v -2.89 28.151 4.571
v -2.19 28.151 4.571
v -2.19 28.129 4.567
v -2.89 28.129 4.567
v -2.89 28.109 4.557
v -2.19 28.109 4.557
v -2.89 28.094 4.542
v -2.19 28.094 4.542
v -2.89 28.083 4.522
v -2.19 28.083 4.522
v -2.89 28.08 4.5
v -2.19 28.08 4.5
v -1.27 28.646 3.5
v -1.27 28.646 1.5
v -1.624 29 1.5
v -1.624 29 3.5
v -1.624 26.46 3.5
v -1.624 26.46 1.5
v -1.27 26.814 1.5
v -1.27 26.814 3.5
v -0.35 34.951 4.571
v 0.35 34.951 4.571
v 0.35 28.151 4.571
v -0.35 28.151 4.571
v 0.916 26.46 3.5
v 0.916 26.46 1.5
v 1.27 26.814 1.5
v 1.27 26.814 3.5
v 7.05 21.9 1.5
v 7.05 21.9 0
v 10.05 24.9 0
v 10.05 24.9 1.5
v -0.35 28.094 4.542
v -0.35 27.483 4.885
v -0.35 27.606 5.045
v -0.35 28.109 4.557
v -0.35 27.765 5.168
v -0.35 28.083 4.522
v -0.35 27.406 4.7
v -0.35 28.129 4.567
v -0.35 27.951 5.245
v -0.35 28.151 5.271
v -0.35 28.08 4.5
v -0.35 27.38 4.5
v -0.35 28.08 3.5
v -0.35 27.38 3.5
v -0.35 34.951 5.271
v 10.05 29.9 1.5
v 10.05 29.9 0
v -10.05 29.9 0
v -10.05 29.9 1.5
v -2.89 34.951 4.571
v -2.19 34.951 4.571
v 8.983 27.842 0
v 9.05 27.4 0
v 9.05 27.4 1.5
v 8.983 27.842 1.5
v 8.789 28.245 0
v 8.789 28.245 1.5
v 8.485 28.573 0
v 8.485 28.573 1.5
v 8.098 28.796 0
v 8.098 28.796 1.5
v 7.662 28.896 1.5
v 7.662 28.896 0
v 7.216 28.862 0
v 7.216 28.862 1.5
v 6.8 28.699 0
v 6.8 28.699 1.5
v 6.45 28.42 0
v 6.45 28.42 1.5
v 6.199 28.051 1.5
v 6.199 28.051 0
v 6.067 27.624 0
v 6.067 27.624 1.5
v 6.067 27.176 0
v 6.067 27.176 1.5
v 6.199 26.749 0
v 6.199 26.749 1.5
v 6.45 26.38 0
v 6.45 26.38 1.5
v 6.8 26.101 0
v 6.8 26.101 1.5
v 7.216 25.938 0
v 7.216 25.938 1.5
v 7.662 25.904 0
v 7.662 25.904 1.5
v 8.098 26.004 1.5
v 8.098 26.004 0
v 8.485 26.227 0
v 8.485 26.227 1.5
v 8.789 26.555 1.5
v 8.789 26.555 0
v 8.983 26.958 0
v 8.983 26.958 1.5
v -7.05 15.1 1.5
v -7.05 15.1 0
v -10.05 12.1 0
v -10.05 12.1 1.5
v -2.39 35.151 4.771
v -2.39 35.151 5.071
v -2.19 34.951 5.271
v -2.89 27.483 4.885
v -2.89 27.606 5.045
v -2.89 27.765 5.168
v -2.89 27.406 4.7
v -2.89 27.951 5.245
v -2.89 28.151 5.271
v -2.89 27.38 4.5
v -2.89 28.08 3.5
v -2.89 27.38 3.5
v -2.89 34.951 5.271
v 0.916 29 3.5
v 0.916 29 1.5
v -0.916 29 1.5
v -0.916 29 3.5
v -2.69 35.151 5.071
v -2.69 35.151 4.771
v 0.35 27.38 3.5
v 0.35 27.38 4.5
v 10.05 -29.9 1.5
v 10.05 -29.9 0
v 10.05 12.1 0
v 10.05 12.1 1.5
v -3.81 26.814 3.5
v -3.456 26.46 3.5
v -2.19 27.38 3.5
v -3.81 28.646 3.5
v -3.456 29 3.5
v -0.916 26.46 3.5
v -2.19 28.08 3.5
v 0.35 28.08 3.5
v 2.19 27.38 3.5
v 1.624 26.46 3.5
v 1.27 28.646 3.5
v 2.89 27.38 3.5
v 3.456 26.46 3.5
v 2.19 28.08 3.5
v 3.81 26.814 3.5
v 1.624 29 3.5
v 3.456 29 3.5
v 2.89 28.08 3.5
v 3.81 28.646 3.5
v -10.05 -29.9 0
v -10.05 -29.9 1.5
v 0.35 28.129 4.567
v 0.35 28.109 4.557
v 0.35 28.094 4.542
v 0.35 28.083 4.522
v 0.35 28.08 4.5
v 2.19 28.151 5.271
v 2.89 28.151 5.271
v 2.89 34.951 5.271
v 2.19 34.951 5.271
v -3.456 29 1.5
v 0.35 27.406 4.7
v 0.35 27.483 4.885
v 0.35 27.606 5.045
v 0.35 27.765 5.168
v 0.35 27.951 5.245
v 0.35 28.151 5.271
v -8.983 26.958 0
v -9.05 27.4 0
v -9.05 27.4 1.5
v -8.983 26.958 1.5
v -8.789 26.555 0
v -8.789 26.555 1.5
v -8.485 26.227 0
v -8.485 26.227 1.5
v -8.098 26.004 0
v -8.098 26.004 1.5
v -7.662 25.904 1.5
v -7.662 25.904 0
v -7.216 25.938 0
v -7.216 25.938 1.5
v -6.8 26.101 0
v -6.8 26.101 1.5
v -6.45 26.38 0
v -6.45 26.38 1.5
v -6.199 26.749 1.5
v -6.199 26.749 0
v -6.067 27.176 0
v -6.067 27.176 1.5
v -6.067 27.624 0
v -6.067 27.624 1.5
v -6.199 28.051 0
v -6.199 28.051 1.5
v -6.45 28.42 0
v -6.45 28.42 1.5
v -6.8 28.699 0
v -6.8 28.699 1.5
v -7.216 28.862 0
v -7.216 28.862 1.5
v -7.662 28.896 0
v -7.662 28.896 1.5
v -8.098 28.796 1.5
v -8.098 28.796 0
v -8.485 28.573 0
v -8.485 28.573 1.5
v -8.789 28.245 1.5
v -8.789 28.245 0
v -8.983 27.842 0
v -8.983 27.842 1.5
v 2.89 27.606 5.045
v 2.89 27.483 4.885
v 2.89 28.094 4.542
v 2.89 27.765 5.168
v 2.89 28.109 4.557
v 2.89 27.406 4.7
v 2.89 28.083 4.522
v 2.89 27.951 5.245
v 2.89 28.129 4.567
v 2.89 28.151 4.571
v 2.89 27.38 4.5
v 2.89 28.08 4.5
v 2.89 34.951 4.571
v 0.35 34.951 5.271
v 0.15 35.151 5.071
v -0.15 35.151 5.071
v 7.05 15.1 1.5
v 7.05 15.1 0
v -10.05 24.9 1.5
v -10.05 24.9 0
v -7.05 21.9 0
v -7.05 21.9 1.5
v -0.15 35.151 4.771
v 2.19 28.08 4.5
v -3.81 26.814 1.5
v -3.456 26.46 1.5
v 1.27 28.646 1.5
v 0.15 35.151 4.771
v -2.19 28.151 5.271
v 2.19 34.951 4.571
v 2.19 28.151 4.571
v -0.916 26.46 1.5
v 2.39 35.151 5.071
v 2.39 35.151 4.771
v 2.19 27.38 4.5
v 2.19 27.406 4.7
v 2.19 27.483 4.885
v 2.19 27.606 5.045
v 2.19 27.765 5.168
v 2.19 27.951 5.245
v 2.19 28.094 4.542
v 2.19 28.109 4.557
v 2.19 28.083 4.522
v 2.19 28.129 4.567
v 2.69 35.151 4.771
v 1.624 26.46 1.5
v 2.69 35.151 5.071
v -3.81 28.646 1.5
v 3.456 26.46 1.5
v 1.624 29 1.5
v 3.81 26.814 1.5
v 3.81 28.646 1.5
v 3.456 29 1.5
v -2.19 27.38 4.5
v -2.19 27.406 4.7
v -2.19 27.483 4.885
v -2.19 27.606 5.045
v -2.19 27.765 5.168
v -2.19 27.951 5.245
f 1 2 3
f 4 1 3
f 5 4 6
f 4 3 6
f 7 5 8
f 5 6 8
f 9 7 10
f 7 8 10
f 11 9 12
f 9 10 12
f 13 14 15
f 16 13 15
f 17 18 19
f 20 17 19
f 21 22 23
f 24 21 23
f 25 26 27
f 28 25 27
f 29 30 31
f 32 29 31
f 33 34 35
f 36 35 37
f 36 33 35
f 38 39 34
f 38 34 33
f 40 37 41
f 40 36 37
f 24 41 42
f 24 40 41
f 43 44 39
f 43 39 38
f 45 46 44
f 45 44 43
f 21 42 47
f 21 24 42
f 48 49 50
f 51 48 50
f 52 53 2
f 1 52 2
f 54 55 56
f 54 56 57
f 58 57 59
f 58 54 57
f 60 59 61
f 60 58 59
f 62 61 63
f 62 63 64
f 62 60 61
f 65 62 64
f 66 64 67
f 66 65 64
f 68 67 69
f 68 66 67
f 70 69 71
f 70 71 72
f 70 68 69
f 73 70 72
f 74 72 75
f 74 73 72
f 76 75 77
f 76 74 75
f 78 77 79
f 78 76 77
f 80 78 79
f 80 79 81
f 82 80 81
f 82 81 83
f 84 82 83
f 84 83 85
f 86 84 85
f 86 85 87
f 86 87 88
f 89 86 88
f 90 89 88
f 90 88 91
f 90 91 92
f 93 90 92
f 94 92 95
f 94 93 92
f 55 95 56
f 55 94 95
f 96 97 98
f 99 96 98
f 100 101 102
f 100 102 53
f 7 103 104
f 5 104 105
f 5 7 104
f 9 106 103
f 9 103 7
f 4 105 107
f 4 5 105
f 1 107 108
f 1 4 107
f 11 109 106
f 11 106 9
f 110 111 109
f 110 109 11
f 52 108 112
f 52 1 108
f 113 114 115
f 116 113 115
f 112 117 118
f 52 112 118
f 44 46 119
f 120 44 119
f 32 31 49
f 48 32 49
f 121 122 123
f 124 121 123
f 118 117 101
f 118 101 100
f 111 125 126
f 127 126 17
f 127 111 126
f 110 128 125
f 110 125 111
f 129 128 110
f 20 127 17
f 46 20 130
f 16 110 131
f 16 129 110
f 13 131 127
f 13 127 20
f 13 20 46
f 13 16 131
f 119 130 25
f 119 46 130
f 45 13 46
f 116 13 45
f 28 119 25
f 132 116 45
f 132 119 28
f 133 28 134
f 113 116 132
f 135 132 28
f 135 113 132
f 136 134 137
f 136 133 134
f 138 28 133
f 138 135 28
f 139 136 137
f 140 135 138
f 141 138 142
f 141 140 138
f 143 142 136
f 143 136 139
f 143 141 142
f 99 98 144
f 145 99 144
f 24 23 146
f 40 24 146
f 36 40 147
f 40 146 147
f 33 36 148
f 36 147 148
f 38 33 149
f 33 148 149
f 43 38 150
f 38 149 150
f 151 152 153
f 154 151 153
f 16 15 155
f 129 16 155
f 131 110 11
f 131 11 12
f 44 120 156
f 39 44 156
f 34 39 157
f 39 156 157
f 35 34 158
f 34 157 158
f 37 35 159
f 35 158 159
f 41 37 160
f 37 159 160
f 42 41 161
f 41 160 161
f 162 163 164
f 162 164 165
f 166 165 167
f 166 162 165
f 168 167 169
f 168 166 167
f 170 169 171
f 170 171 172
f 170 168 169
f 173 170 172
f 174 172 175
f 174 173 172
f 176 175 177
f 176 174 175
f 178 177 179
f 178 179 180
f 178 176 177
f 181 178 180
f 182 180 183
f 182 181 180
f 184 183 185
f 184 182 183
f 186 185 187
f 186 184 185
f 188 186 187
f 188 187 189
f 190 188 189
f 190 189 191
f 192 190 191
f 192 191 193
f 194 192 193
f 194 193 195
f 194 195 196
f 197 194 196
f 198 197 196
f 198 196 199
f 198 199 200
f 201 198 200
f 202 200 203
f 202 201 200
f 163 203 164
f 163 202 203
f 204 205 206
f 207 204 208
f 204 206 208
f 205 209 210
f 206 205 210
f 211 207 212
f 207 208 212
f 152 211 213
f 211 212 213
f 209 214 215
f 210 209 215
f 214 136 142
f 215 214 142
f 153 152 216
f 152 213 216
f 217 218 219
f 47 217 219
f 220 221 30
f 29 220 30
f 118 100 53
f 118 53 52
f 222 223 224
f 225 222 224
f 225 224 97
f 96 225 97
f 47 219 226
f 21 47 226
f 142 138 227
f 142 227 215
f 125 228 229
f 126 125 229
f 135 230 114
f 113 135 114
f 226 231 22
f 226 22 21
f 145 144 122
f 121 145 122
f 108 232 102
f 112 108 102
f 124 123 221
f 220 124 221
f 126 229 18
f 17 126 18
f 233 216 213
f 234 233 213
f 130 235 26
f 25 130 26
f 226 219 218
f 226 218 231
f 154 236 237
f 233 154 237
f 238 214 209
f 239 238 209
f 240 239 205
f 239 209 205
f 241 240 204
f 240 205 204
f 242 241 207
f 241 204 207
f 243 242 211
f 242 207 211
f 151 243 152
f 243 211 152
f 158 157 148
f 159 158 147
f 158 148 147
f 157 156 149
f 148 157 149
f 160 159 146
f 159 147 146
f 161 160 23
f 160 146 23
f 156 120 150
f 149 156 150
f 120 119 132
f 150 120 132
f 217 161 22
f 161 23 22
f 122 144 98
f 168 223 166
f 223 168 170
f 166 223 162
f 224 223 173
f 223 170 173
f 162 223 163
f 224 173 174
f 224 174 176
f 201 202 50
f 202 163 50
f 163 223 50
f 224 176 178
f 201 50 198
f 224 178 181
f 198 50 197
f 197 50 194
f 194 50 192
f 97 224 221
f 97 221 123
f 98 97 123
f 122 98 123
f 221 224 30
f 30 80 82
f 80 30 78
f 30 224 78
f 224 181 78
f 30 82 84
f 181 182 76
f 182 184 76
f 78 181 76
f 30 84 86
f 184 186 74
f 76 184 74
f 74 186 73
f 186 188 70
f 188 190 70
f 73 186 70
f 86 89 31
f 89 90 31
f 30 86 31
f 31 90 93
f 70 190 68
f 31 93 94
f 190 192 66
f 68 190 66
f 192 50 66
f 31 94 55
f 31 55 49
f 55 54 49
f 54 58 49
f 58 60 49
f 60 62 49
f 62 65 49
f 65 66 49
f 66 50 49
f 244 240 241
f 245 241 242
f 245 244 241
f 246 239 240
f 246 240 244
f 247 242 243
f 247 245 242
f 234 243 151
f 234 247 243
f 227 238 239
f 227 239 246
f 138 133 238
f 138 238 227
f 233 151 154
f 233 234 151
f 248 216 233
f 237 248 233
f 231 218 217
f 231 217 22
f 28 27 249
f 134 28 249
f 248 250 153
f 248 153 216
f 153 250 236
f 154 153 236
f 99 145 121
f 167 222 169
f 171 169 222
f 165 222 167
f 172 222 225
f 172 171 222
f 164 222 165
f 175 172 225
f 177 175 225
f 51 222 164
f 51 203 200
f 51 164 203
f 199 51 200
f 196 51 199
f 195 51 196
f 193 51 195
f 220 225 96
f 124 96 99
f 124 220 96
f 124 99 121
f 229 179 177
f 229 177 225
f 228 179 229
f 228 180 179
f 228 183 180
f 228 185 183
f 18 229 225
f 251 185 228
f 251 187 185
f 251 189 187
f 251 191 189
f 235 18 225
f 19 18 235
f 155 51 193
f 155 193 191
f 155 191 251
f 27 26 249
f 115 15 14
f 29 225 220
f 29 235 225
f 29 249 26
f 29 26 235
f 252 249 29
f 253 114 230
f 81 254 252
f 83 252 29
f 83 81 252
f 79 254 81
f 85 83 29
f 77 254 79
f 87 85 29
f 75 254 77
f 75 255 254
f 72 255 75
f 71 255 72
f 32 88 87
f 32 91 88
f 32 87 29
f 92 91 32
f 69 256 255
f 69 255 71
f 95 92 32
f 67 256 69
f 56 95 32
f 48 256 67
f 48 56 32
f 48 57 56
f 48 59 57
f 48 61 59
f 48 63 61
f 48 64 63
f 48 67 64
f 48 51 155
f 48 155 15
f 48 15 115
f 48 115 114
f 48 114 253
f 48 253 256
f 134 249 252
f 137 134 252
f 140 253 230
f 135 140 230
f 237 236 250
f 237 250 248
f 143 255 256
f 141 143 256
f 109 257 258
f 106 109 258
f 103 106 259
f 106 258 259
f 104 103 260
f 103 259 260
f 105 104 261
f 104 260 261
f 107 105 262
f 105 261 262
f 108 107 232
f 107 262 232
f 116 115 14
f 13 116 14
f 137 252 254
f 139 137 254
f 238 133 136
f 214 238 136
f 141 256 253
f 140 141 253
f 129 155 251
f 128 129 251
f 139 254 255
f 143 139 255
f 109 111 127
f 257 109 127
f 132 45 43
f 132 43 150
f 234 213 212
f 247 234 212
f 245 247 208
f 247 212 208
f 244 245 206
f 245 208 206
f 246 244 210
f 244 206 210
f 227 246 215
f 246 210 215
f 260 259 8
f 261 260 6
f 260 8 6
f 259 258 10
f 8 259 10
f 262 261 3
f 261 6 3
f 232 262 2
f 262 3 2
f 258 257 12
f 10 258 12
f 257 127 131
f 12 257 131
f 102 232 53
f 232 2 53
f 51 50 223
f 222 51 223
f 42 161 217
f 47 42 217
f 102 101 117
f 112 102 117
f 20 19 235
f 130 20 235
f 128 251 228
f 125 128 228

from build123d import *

# Parameters (mm, degrees)
SKETCH_1_R             = 1.5
EXTRUDE_1_DEPTH        = 1.5
EXTRUDE_2_DEPTH        = 2
SKETCH_4_W             = 0.7
SKETCH_4_H             = 0.7
EXTRUDE_3_DEPTH        = 1
EXTRUDE_4_DEPTH        = 0.7
PATTERN_LINEAR_1_COUNT = 3
PATTERN_LINEAR_1_PITCH = 2.54
CHAMFER_1_SIZE         = 0.2


with BuildPart() as part:
    # 草图1 → 凸台-拉伸1 (new body)
    with BuildSketch(Plane.XY):
        Polygon((-10.05, -29.9), (10.05, -29.9), (10.05, 12.1), (7.05, 15.1), (7.05, 21.9), (10.05, 24.9), (10.05, 29.9), (-10.05, 29.9), (-10.05, 24.9), (-7.05, 21.9), (-7.05, 15.1), (-10.05, 12.1), align=None)
        with Locations((7.55, 27.4)):
            Circle(SKETCH_1_R, mode=Mode.SUBTRACT)
        with Locations(Location((-7.55, 27.4, 0), (0, 0, 180))):
            Circle(SKETCH_1_R, mode=Mode.SUBTRACT)
    extrude(amount=EXTRUDE_1_DEPTH)

    # 草图3 → 凸台-拉伸2 (add)
    with BuildSketch(Plane.XY.offset(1.5)):
        Polygon((-3.456446609, 29), (-3.81, 28.646446609), (-3.81, 26.813553391), (-3.456446609, 26.46), (-1.623553391, 26.46), (-1.27, 26.813553391), (-0.916446609, 26.46), (0.916446609, 26.46), (1.27, 26.813553391), (1.623553391, 26.46), (3.456446609, 26.46), (3.81, 26.813553391), (3.81, 28.646446609), (3.456446609, 29), (1.623553391, 29), (1.27, 28.646446609), (0.916446609, 29), (-0.916446609, 29), (-1.27, 28.646446609), (-1.623553391, 29), align=None)
    extrude(amount=EXTRUDE_2_DEPTH)

    # 草图4 → 凸台-拉伸3 (add)
    with BuildSketch(Plane.XY.offset(3.5)):
        with Locations((-2.54, 27.73)):
            Rectangle(SKETCH_4_W, SKETCH_4_H)
        with Locations((0, 27.73)):
            Rectangle(SKETCH_4_W, SKETCH_4_H)
        with Locations((2.54, 27.73)):
            Rectangle(SKETCH_4_W, SKETCH_4_H)
    extrude(amount=EXTRUDE_3_DEPTH)

    # 草图5 → 凸台-拉伸4 (add)
    with BuildSketch(Plane(origin=(2.89, 0, 0), x_dir=(0, 0, -1), z_dir=(1, 0, 0))):
        with BuildLine():
            Line((-3.5, 27.38), (-4.5, 27.38))
            ThreePointArc((-4.5, 27.38), (-5.045144747, 27.605806348), (-5.270951094, 28.150951094))
            Line((-5.270951094, 28.150951094), (-5.270951094, 35.150951094))
            Line((-5.270951094, 35.150951094), (-4.570951094, 35.150951094))
            Line((-4.570951094, 35.150951094), (-4.570951094, 28.150951094))
            ThreePointArc((-4.570951094, 28.150951094), (-4.55017, 28.100781094), (-4.5, 28.08))
            Line((-4.5, 28.08), (-3.5, 28.08))
            Line((-3.5, 28.08), (-3.5, 27.38))
        make_face()
    extrude_4 = extrude(amount=-EXTRUDE_4_DEPTH)

    # 阵列(线性)1: 凸台-拉伸4 ×3
    with Locations(*[(-i * PATTERN_LINEAR_1_PITCH, 0, 0) for i in range(1, PATTERN_LINEAR_1_COUNT)]):
        add(extrude_4)

    # 倒角1
    chamfer_1_edges = [part.edges().sort_by_distance(p)[0] for p in [
        (2.89, 35.150951094, 4.920951094),
        (2.19, 35.150951094, 4.920951094),
        (2.54, 35.150951094, 5.270951094),
        (2.54, 35.150951094, 4.570951094),
        (0.35, 35.150951094, 4.920951094),
        (-0.35, 35.150951094, 4.920951094),
        (0, 35.150951094, 5.270951094),
        (0, 35.150951094, 4.570951094),
        (-2.89, 35.150951094, 4.920951094),
        (-2.54, 35.150951094, 5.270951094),
        (-2.54, 35.150951094, 4.570951094),
        (-2.19, 35.150951094, 4.920951094),
    ]]
    chamfer(chamfer_1_edges, length=CHAMFER_1_SIZE)


solid = part.part
